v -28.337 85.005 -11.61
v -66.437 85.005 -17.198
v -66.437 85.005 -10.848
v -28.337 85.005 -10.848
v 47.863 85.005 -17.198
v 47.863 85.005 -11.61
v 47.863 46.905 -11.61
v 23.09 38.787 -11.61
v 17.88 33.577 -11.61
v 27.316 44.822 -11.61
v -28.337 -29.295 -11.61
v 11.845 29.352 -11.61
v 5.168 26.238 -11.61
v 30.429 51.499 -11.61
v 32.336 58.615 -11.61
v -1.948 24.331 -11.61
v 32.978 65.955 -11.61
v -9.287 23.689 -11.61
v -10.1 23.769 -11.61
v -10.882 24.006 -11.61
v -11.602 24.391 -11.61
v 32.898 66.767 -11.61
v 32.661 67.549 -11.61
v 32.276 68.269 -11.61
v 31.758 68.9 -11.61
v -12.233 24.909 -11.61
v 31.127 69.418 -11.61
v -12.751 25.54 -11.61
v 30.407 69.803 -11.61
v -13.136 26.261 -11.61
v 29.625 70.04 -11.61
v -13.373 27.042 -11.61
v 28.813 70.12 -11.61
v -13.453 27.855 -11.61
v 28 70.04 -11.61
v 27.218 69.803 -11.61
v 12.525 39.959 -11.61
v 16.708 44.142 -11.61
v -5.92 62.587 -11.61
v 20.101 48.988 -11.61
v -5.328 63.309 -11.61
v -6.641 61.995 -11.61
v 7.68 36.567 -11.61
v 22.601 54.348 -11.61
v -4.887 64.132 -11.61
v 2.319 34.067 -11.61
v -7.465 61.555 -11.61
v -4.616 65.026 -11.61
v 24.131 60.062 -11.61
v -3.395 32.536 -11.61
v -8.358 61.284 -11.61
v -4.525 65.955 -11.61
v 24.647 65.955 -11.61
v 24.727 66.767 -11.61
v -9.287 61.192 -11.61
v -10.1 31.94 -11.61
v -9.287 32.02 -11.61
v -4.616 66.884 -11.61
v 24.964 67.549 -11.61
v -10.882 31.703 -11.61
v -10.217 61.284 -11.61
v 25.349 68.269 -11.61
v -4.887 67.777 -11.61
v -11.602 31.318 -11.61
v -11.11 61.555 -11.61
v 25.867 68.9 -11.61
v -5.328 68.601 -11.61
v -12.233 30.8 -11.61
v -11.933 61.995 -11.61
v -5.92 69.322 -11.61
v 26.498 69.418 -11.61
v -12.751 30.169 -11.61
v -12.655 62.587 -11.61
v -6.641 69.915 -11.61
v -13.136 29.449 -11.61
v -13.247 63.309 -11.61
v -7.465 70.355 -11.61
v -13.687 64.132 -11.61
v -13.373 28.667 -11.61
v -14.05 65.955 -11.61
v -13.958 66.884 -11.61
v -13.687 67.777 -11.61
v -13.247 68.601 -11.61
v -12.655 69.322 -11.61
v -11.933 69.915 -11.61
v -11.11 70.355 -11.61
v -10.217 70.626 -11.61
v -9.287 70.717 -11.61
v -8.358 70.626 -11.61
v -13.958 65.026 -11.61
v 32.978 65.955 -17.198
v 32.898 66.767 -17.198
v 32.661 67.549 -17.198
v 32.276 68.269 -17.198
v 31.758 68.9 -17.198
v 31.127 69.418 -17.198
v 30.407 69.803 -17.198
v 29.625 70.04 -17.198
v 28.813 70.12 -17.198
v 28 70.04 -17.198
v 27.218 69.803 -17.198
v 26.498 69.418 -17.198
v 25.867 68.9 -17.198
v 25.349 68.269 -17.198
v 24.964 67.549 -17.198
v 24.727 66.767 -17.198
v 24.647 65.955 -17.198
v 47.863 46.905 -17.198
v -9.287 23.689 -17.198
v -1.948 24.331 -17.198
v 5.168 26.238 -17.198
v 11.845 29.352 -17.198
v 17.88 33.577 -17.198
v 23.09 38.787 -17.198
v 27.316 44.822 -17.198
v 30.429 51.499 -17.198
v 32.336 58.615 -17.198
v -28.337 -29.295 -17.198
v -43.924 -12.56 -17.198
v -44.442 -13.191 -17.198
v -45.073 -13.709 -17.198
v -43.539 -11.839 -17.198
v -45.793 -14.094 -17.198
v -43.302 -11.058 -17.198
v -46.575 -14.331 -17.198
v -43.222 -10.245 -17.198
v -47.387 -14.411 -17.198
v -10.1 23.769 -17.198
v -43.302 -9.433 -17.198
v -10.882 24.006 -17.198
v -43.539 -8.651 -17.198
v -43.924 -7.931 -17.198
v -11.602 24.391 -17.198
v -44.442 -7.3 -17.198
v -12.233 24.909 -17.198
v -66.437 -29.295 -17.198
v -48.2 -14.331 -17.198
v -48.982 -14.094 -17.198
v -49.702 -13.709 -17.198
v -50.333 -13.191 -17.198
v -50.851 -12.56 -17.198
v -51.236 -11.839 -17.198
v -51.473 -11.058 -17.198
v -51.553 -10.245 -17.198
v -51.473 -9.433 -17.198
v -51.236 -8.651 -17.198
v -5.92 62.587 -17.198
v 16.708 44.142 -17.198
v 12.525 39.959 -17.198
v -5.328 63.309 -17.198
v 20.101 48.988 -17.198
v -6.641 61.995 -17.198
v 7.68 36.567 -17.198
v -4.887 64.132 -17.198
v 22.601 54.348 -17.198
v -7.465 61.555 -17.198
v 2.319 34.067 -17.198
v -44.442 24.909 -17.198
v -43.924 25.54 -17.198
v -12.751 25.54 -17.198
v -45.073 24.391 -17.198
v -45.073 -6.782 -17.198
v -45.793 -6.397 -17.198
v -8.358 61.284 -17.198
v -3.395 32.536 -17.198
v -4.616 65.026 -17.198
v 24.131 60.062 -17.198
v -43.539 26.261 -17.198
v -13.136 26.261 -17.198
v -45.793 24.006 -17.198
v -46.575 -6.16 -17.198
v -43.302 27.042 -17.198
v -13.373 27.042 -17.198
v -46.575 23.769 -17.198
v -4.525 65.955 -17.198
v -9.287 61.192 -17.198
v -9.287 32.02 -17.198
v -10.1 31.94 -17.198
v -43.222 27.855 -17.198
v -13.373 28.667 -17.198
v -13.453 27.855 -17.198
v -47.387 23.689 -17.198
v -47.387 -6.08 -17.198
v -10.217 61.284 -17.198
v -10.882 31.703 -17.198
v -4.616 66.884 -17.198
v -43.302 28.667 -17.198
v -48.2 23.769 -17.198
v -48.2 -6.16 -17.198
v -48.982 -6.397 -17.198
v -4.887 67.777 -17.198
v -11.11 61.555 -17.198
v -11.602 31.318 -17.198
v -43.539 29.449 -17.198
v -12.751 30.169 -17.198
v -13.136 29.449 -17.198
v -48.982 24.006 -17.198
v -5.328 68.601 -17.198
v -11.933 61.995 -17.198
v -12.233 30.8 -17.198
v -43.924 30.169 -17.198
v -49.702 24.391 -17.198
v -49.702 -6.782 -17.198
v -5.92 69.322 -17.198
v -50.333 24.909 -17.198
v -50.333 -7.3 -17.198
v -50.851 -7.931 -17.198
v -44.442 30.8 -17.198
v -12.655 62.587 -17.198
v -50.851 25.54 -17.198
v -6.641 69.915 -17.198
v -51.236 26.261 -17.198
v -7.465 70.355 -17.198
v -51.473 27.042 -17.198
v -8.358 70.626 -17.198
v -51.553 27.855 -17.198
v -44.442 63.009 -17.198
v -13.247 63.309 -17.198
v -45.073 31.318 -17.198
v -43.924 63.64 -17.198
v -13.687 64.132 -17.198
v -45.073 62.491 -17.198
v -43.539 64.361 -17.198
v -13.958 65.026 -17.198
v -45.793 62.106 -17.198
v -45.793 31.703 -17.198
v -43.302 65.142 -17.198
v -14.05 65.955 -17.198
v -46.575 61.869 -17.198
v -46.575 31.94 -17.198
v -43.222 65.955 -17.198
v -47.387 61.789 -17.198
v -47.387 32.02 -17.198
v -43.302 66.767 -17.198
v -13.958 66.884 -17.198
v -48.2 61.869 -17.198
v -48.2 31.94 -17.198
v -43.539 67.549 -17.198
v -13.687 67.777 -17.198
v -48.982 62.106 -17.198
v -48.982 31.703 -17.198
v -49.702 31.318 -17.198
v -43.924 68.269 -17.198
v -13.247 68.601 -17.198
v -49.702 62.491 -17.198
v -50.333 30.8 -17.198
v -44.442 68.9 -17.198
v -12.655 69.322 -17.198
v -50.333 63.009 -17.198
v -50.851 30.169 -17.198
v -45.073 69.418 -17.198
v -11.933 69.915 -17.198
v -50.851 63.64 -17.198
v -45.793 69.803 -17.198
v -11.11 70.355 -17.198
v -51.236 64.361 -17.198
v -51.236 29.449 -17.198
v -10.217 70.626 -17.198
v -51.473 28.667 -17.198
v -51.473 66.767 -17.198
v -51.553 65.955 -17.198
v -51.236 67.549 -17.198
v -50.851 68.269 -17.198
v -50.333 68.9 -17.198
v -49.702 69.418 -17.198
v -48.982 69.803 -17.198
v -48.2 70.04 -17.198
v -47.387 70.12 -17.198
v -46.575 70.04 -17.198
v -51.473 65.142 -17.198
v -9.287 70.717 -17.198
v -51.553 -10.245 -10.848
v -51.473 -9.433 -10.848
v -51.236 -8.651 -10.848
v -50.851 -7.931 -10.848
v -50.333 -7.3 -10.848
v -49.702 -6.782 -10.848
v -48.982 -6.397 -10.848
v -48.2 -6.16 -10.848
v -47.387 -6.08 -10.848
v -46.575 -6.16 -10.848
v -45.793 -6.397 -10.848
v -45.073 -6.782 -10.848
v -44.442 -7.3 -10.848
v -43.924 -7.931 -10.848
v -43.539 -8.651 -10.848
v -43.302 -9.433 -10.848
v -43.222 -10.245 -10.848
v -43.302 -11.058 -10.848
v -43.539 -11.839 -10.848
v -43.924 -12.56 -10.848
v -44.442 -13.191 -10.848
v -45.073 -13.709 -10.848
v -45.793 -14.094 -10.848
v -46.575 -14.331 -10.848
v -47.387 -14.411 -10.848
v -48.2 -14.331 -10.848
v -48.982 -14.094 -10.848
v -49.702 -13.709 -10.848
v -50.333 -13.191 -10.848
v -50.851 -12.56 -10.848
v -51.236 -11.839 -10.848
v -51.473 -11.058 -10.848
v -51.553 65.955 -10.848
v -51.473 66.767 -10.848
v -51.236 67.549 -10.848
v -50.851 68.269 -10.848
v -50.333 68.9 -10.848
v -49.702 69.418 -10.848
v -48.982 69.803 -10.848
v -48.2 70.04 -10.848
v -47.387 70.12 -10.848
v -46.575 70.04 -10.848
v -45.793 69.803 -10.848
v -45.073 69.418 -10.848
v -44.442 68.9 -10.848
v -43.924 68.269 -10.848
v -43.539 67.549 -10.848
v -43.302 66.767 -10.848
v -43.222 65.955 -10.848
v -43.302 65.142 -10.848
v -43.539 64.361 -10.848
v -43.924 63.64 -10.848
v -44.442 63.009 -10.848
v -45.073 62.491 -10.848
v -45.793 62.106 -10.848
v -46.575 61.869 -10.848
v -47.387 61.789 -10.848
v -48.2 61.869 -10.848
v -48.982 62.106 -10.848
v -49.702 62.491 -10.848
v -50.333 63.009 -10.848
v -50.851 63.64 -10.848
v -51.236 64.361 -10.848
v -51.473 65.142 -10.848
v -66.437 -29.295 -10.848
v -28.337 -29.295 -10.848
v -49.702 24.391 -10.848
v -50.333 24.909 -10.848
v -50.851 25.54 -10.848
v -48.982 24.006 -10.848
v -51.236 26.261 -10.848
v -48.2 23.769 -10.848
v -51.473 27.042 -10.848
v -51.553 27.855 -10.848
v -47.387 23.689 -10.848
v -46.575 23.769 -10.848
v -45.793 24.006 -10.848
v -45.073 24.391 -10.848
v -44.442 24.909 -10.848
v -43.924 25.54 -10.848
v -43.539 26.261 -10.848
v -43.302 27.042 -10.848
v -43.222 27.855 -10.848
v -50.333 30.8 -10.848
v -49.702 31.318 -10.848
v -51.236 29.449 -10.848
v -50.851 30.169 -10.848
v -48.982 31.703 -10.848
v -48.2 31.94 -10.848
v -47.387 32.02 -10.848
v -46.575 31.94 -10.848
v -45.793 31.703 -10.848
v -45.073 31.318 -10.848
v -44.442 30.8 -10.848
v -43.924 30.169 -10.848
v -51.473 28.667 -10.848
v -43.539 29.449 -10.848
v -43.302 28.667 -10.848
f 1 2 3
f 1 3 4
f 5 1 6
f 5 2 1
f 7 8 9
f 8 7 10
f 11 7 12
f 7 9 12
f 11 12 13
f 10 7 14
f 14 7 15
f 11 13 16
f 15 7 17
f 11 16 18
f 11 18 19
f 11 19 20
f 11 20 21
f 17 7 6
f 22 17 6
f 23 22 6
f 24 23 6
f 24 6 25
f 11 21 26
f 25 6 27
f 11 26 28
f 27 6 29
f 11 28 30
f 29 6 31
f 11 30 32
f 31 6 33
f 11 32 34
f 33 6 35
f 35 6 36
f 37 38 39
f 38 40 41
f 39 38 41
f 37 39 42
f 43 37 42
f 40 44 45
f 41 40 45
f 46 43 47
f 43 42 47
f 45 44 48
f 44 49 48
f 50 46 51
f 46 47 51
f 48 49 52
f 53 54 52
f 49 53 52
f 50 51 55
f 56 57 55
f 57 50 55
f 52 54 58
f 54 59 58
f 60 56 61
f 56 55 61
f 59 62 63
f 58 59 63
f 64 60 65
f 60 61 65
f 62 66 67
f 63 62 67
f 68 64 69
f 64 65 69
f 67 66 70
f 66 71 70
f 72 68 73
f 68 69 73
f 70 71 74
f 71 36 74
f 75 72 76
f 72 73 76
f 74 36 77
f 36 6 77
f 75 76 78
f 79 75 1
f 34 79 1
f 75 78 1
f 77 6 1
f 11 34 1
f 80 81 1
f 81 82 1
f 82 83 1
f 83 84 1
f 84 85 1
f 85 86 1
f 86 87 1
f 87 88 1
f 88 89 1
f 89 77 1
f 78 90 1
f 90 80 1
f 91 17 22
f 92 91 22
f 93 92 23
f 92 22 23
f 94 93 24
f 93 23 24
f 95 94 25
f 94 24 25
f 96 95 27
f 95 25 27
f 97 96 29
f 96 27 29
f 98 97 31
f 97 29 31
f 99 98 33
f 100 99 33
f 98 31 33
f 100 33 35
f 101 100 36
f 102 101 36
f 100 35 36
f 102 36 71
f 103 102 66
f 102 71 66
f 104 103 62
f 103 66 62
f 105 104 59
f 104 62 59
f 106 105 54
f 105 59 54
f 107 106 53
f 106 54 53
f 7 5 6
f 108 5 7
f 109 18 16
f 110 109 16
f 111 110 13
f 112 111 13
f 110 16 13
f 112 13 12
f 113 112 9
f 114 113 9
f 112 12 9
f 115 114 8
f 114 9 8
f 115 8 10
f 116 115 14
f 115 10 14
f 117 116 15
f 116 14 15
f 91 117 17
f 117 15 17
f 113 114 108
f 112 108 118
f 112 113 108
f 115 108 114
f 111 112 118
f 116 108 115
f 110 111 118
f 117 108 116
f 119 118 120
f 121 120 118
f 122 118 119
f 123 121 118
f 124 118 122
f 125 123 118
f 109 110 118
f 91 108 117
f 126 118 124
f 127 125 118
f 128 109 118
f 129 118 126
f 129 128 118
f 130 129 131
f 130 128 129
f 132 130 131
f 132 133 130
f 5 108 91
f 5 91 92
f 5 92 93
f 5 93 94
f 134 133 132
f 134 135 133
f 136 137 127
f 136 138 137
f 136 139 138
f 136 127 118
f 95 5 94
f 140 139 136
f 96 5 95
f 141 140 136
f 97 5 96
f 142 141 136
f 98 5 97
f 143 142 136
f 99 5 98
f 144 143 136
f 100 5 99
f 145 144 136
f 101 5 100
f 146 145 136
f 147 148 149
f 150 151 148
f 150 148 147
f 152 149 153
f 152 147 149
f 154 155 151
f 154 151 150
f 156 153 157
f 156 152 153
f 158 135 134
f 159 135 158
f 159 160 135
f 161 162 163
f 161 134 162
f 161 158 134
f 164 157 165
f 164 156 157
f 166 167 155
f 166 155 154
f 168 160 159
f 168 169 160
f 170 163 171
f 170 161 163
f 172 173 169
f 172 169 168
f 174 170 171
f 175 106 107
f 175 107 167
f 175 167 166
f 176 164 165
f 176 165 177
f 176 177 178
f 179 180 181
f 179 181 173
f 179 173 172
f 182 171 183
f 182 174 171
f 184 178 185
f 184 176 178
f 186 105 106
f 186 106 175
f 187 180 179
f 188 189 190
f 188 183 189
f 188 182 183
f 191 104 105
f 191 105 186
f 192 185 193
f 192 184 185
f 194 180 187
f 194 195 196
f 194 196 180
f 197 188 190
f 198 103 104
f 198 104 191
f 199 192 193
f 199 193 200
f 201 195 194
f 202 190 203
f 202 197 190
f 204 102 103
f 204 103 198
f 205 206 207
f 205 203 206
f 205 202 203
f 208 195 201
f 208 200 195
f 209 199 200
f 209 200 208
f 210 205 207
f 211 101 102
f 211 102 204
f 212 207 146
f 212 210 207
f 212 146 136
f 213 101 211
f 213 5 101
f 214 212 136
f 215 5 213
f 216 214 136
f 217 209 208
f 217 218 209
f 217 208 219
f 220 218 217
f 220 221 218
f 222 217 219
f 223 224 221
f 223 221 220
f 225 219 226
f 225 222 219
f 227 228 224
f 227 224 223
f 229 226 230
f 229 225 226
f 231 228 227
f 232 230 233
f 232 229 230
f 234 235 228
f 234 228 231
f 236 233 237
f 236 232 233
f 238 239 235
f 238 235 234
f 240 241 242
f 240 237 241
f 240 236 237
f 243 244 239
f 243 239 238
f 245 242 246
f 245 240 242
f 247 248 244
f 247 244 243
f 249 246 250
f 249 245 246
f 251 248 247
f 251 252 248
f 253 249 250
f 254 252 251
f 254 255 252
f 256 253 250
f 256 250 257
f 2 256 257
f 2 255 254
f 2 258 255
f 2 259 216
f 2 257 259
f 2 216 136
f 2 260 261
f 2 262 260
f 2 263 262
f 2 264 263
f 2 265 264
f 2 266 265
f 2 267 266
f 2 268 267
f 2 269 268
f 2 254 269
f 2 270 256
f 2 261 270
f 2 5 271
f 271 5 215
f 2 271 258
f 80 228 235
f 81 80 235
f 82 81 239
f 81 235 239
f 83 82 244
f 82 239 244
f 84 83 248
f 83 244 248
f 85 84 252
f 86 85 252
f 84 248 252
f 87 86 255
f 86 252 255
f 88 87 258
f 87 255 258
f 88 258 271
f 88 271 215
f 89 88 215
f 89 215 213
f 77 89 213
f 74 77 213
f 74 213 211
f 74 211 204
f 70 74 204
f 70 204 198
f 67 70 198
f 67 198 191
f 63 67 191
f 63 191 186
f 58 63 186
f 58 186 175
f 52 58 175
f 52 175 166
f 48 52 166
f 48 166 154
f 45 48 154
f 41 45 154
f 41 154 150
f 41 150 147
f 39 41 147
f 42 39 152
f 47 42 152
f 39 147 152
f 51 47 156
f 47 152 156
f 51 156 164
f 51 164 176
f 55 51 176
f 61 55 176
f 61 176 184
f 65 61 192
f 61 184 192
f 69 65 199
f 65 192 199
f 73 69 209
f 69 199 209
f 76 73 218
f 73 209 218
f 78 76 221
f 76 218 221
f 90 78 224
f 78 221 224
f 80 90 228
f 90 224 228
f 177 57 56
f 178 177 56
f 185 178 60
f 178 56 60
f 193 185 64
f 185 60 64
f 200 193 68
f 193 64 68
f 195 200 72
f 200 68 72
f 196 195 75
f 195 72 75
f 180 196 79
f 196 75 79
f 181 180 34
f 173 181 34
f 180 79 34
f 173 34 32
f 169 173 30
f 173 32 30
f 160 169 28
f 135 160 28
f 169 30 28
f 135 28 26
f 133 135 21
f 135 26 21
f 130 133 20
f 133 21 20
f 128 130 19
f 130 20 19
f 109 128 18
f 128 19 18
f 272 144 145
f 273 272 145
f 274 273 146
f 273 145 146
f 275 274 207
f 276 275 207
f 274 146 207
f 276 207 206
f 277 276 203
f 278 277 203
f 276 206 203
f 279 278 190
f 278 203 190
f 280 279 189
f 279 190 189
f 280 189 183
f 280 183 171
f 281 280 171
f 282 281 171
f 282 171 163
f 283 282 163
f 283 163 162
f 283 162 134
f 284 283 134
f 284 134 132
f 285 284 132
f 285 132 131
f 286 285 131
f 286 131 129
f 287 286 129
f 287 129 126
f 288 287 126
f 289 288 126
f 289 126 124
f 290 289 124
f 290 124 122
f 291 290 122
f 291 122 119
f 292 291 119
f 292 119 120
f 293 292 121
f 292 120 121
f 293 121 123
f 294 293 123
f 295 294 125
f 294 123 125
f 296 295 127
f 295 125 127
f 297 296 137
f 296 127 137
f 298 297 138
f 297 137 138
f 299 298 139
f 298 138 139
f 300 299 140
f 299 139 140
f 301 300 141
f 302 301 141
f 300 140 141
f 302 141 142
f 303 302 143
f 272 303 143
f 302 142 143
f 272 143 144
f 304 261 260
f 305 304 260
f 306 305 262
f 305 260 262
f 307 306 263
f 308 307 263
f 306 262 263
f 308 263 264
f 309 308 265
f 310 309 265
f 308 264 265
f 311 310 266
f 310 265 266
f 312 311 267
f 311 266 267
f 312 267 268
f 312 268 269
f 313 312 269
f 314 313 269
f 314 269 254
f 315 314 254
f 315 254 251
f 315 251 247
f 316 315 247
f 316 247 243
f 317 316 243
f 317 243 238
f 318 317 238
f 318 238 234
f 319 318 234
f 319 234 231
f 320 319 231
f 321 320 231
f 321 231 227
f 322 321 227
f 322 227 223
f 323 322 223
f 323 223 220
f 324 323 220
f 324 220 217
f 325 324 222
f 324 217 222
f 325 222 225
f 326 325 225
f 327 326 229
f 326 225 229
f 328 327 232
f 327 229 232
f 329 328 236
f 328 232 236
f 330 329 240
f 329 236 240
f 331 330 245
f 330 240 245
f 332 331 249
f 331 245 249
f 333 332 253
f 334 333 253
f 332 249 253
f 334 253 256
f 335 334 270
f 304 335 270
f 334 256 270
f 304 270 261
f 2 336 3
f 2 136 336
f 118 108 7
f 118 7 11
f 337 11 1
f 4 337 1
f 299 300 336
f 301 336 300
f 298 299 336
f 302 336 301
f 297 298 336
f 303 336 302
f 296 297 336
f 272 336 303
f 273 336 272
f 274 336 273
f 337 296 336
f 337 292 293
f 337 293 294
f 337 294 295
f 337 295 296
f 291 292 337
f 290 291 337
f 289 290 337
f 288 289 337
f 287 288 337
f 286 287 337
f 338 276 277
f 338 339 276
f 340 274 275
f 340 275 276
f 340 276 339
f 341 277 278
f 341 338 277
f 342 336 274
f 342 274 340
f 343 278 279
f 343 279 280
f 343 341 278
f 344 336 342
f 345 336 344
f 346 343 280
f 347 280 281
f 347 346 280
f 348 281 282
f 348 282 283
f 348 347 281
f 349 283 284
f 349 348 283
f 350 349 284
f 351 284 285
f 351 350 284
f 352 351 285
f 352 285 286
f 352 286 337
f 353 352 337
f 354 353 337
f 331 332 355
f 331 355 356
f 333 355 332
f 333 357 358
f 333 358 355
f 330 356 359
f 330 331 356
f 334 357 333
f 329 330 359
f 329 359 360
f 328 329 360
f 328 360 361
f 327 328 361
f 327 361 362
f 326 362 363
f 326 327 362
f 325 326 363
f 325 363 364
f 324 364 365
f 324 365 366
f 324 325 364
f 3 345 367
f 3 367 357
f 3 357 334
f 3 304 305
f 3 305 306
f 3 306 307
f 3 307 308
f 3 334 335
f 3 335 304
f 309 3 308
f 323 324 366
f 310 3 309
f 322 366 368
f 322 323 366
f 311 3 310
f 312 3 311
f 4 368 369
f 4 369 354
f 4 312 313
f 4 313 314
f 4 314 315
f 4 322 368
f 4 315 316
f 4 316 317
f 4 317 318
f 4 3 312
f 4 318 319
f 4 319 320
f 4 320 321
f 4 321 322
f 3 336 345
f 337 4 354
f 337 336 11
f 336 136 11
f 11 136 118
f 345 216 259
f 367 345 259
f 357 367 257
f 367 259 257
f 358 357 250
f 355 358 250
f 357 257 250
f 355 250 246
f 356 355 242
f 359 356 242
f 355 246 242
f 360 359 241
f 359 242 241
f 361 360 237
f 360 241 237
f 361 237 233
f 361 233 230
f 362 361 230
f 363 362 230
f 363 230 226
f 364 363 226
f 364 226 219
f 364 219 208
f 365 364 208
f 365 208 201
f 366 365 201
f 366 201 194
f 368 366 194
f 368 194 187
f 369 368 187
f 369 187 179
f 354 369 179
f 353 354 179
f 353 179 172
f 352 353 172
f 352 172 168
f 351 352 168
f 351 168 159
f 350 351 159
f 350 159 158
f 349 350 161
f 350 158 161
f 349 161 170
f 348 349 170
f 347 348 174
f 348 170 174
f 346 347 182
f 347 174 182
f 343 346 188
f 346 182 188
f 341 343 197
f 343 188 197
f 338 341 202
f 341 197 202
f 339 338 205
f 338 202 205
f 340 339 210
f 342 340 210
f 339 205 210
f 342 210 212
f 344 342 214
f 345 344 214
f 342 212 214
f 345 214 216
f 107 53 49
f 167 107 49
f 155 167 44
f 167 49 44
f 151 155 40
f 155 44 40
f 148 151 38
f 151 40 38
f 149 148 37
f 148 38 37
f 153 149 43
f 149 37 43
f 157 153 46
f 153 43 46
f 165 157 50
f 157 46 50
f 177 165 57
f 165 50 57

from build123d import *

# Parameters (mm, degrees)
BOSS_EXTRUDE1_DEPTH  = 5.588
SKETCH2_W            = 38.1
SKETCH2_H            = 114.3
BOSS_EXTRUDE2_DEPTH  = 0.762
CUT_EXTRUDE1_DEPTH   = 109.03221727
HOLE1_D              = 8.3312
HOLE2_D              = 8.3312
HOLE3_D              = 8.3312
M8_CLEARANCE_HOLE1_D = 9.525


with BuildPart() as part:
    # Sketch1 → Boss-Extrude1 (new body)
    with BuildSketch(Plane(origin=(0, 0, -17.198296107), x_dir=(-1, 0, 0), z_dir=(0, 0, -1))):
        Polygon((-47.86260239, 85.004743533), (-47.86260239, 46.904743533), (28.33739761, -29.295256467), (66.43739761, -29.295256467), (66.43739761, 85.004743533), align=None)
    extrude(amount=-BOSS_EXTRUDE1_DEPTH)

    # Sketch2 → Boss-Extrude2 (add)
    with BuildSketch(Plane.XY.offset(-11.610296107)):
        with Locations((-47.38739761, 27.854743533)):
            Rectangle(SKETCH2_W, SKETCH2_H)
    extrude(amount=BOSS_EXTRUDE2_DEPTH)

    # Sketch3 → Cut-Extrude1 (cut, through all)
    with BuildSketch(Plane.XY.offset(-11.610296107)):
        with BuildLine():
            ThreePointArc((-9.28739761, 23.689143533), (20.598894761, 36.068451162), (32.97820239, 65.954743533))
            ThreePointArc((32.97820239, 65.954743533), (28.81260239, 70.120343533), (24.64700239, 65.954743533))
            ThreePointArc((24.64700239, 65.954743533), (14.707846746, 41.959499178), (-9.28739761, 32.020343533))
            ThreePointArc((-9.28739761, 32.020343533), (-13.45299761, 27.854743533), (-9.28739761, 23.689143533))
        make_face()
    extrude(amount=-CUT_EXTRUDE1_DEPTH, mode=Mode.SUBTRACT)

    # Hole1 (through all)
    with Locations(Plane.XY.offset(-10.848296107)):
        with Locations((-47.38739761, -10.245256467)):
            Hole(HOLE1_D / 2)

    # Hole2 (through all)
    with Locations(Plane.XY.offset(-10.848296107)):
        with Locations((-47.38739761, 65.954743533)):
            Hole(HOLE2_D / 2)

    # Hole3 (through all)
    with Locations(Plane.XY.offset(-10.848296107)):
        with Locations((-47.38739761, 27.854743533)):
            Hole(HOLE3_D / 2)

    # M8 Clearance Hole1 (through all)
    with Locations(Plane.XY.offset(-11.610296107)):
        with Locations((-9.28739761, 65.954743533)):
            Hole(M8_CLEARANCE_HOLE1_D / 2)


solid = part.part
